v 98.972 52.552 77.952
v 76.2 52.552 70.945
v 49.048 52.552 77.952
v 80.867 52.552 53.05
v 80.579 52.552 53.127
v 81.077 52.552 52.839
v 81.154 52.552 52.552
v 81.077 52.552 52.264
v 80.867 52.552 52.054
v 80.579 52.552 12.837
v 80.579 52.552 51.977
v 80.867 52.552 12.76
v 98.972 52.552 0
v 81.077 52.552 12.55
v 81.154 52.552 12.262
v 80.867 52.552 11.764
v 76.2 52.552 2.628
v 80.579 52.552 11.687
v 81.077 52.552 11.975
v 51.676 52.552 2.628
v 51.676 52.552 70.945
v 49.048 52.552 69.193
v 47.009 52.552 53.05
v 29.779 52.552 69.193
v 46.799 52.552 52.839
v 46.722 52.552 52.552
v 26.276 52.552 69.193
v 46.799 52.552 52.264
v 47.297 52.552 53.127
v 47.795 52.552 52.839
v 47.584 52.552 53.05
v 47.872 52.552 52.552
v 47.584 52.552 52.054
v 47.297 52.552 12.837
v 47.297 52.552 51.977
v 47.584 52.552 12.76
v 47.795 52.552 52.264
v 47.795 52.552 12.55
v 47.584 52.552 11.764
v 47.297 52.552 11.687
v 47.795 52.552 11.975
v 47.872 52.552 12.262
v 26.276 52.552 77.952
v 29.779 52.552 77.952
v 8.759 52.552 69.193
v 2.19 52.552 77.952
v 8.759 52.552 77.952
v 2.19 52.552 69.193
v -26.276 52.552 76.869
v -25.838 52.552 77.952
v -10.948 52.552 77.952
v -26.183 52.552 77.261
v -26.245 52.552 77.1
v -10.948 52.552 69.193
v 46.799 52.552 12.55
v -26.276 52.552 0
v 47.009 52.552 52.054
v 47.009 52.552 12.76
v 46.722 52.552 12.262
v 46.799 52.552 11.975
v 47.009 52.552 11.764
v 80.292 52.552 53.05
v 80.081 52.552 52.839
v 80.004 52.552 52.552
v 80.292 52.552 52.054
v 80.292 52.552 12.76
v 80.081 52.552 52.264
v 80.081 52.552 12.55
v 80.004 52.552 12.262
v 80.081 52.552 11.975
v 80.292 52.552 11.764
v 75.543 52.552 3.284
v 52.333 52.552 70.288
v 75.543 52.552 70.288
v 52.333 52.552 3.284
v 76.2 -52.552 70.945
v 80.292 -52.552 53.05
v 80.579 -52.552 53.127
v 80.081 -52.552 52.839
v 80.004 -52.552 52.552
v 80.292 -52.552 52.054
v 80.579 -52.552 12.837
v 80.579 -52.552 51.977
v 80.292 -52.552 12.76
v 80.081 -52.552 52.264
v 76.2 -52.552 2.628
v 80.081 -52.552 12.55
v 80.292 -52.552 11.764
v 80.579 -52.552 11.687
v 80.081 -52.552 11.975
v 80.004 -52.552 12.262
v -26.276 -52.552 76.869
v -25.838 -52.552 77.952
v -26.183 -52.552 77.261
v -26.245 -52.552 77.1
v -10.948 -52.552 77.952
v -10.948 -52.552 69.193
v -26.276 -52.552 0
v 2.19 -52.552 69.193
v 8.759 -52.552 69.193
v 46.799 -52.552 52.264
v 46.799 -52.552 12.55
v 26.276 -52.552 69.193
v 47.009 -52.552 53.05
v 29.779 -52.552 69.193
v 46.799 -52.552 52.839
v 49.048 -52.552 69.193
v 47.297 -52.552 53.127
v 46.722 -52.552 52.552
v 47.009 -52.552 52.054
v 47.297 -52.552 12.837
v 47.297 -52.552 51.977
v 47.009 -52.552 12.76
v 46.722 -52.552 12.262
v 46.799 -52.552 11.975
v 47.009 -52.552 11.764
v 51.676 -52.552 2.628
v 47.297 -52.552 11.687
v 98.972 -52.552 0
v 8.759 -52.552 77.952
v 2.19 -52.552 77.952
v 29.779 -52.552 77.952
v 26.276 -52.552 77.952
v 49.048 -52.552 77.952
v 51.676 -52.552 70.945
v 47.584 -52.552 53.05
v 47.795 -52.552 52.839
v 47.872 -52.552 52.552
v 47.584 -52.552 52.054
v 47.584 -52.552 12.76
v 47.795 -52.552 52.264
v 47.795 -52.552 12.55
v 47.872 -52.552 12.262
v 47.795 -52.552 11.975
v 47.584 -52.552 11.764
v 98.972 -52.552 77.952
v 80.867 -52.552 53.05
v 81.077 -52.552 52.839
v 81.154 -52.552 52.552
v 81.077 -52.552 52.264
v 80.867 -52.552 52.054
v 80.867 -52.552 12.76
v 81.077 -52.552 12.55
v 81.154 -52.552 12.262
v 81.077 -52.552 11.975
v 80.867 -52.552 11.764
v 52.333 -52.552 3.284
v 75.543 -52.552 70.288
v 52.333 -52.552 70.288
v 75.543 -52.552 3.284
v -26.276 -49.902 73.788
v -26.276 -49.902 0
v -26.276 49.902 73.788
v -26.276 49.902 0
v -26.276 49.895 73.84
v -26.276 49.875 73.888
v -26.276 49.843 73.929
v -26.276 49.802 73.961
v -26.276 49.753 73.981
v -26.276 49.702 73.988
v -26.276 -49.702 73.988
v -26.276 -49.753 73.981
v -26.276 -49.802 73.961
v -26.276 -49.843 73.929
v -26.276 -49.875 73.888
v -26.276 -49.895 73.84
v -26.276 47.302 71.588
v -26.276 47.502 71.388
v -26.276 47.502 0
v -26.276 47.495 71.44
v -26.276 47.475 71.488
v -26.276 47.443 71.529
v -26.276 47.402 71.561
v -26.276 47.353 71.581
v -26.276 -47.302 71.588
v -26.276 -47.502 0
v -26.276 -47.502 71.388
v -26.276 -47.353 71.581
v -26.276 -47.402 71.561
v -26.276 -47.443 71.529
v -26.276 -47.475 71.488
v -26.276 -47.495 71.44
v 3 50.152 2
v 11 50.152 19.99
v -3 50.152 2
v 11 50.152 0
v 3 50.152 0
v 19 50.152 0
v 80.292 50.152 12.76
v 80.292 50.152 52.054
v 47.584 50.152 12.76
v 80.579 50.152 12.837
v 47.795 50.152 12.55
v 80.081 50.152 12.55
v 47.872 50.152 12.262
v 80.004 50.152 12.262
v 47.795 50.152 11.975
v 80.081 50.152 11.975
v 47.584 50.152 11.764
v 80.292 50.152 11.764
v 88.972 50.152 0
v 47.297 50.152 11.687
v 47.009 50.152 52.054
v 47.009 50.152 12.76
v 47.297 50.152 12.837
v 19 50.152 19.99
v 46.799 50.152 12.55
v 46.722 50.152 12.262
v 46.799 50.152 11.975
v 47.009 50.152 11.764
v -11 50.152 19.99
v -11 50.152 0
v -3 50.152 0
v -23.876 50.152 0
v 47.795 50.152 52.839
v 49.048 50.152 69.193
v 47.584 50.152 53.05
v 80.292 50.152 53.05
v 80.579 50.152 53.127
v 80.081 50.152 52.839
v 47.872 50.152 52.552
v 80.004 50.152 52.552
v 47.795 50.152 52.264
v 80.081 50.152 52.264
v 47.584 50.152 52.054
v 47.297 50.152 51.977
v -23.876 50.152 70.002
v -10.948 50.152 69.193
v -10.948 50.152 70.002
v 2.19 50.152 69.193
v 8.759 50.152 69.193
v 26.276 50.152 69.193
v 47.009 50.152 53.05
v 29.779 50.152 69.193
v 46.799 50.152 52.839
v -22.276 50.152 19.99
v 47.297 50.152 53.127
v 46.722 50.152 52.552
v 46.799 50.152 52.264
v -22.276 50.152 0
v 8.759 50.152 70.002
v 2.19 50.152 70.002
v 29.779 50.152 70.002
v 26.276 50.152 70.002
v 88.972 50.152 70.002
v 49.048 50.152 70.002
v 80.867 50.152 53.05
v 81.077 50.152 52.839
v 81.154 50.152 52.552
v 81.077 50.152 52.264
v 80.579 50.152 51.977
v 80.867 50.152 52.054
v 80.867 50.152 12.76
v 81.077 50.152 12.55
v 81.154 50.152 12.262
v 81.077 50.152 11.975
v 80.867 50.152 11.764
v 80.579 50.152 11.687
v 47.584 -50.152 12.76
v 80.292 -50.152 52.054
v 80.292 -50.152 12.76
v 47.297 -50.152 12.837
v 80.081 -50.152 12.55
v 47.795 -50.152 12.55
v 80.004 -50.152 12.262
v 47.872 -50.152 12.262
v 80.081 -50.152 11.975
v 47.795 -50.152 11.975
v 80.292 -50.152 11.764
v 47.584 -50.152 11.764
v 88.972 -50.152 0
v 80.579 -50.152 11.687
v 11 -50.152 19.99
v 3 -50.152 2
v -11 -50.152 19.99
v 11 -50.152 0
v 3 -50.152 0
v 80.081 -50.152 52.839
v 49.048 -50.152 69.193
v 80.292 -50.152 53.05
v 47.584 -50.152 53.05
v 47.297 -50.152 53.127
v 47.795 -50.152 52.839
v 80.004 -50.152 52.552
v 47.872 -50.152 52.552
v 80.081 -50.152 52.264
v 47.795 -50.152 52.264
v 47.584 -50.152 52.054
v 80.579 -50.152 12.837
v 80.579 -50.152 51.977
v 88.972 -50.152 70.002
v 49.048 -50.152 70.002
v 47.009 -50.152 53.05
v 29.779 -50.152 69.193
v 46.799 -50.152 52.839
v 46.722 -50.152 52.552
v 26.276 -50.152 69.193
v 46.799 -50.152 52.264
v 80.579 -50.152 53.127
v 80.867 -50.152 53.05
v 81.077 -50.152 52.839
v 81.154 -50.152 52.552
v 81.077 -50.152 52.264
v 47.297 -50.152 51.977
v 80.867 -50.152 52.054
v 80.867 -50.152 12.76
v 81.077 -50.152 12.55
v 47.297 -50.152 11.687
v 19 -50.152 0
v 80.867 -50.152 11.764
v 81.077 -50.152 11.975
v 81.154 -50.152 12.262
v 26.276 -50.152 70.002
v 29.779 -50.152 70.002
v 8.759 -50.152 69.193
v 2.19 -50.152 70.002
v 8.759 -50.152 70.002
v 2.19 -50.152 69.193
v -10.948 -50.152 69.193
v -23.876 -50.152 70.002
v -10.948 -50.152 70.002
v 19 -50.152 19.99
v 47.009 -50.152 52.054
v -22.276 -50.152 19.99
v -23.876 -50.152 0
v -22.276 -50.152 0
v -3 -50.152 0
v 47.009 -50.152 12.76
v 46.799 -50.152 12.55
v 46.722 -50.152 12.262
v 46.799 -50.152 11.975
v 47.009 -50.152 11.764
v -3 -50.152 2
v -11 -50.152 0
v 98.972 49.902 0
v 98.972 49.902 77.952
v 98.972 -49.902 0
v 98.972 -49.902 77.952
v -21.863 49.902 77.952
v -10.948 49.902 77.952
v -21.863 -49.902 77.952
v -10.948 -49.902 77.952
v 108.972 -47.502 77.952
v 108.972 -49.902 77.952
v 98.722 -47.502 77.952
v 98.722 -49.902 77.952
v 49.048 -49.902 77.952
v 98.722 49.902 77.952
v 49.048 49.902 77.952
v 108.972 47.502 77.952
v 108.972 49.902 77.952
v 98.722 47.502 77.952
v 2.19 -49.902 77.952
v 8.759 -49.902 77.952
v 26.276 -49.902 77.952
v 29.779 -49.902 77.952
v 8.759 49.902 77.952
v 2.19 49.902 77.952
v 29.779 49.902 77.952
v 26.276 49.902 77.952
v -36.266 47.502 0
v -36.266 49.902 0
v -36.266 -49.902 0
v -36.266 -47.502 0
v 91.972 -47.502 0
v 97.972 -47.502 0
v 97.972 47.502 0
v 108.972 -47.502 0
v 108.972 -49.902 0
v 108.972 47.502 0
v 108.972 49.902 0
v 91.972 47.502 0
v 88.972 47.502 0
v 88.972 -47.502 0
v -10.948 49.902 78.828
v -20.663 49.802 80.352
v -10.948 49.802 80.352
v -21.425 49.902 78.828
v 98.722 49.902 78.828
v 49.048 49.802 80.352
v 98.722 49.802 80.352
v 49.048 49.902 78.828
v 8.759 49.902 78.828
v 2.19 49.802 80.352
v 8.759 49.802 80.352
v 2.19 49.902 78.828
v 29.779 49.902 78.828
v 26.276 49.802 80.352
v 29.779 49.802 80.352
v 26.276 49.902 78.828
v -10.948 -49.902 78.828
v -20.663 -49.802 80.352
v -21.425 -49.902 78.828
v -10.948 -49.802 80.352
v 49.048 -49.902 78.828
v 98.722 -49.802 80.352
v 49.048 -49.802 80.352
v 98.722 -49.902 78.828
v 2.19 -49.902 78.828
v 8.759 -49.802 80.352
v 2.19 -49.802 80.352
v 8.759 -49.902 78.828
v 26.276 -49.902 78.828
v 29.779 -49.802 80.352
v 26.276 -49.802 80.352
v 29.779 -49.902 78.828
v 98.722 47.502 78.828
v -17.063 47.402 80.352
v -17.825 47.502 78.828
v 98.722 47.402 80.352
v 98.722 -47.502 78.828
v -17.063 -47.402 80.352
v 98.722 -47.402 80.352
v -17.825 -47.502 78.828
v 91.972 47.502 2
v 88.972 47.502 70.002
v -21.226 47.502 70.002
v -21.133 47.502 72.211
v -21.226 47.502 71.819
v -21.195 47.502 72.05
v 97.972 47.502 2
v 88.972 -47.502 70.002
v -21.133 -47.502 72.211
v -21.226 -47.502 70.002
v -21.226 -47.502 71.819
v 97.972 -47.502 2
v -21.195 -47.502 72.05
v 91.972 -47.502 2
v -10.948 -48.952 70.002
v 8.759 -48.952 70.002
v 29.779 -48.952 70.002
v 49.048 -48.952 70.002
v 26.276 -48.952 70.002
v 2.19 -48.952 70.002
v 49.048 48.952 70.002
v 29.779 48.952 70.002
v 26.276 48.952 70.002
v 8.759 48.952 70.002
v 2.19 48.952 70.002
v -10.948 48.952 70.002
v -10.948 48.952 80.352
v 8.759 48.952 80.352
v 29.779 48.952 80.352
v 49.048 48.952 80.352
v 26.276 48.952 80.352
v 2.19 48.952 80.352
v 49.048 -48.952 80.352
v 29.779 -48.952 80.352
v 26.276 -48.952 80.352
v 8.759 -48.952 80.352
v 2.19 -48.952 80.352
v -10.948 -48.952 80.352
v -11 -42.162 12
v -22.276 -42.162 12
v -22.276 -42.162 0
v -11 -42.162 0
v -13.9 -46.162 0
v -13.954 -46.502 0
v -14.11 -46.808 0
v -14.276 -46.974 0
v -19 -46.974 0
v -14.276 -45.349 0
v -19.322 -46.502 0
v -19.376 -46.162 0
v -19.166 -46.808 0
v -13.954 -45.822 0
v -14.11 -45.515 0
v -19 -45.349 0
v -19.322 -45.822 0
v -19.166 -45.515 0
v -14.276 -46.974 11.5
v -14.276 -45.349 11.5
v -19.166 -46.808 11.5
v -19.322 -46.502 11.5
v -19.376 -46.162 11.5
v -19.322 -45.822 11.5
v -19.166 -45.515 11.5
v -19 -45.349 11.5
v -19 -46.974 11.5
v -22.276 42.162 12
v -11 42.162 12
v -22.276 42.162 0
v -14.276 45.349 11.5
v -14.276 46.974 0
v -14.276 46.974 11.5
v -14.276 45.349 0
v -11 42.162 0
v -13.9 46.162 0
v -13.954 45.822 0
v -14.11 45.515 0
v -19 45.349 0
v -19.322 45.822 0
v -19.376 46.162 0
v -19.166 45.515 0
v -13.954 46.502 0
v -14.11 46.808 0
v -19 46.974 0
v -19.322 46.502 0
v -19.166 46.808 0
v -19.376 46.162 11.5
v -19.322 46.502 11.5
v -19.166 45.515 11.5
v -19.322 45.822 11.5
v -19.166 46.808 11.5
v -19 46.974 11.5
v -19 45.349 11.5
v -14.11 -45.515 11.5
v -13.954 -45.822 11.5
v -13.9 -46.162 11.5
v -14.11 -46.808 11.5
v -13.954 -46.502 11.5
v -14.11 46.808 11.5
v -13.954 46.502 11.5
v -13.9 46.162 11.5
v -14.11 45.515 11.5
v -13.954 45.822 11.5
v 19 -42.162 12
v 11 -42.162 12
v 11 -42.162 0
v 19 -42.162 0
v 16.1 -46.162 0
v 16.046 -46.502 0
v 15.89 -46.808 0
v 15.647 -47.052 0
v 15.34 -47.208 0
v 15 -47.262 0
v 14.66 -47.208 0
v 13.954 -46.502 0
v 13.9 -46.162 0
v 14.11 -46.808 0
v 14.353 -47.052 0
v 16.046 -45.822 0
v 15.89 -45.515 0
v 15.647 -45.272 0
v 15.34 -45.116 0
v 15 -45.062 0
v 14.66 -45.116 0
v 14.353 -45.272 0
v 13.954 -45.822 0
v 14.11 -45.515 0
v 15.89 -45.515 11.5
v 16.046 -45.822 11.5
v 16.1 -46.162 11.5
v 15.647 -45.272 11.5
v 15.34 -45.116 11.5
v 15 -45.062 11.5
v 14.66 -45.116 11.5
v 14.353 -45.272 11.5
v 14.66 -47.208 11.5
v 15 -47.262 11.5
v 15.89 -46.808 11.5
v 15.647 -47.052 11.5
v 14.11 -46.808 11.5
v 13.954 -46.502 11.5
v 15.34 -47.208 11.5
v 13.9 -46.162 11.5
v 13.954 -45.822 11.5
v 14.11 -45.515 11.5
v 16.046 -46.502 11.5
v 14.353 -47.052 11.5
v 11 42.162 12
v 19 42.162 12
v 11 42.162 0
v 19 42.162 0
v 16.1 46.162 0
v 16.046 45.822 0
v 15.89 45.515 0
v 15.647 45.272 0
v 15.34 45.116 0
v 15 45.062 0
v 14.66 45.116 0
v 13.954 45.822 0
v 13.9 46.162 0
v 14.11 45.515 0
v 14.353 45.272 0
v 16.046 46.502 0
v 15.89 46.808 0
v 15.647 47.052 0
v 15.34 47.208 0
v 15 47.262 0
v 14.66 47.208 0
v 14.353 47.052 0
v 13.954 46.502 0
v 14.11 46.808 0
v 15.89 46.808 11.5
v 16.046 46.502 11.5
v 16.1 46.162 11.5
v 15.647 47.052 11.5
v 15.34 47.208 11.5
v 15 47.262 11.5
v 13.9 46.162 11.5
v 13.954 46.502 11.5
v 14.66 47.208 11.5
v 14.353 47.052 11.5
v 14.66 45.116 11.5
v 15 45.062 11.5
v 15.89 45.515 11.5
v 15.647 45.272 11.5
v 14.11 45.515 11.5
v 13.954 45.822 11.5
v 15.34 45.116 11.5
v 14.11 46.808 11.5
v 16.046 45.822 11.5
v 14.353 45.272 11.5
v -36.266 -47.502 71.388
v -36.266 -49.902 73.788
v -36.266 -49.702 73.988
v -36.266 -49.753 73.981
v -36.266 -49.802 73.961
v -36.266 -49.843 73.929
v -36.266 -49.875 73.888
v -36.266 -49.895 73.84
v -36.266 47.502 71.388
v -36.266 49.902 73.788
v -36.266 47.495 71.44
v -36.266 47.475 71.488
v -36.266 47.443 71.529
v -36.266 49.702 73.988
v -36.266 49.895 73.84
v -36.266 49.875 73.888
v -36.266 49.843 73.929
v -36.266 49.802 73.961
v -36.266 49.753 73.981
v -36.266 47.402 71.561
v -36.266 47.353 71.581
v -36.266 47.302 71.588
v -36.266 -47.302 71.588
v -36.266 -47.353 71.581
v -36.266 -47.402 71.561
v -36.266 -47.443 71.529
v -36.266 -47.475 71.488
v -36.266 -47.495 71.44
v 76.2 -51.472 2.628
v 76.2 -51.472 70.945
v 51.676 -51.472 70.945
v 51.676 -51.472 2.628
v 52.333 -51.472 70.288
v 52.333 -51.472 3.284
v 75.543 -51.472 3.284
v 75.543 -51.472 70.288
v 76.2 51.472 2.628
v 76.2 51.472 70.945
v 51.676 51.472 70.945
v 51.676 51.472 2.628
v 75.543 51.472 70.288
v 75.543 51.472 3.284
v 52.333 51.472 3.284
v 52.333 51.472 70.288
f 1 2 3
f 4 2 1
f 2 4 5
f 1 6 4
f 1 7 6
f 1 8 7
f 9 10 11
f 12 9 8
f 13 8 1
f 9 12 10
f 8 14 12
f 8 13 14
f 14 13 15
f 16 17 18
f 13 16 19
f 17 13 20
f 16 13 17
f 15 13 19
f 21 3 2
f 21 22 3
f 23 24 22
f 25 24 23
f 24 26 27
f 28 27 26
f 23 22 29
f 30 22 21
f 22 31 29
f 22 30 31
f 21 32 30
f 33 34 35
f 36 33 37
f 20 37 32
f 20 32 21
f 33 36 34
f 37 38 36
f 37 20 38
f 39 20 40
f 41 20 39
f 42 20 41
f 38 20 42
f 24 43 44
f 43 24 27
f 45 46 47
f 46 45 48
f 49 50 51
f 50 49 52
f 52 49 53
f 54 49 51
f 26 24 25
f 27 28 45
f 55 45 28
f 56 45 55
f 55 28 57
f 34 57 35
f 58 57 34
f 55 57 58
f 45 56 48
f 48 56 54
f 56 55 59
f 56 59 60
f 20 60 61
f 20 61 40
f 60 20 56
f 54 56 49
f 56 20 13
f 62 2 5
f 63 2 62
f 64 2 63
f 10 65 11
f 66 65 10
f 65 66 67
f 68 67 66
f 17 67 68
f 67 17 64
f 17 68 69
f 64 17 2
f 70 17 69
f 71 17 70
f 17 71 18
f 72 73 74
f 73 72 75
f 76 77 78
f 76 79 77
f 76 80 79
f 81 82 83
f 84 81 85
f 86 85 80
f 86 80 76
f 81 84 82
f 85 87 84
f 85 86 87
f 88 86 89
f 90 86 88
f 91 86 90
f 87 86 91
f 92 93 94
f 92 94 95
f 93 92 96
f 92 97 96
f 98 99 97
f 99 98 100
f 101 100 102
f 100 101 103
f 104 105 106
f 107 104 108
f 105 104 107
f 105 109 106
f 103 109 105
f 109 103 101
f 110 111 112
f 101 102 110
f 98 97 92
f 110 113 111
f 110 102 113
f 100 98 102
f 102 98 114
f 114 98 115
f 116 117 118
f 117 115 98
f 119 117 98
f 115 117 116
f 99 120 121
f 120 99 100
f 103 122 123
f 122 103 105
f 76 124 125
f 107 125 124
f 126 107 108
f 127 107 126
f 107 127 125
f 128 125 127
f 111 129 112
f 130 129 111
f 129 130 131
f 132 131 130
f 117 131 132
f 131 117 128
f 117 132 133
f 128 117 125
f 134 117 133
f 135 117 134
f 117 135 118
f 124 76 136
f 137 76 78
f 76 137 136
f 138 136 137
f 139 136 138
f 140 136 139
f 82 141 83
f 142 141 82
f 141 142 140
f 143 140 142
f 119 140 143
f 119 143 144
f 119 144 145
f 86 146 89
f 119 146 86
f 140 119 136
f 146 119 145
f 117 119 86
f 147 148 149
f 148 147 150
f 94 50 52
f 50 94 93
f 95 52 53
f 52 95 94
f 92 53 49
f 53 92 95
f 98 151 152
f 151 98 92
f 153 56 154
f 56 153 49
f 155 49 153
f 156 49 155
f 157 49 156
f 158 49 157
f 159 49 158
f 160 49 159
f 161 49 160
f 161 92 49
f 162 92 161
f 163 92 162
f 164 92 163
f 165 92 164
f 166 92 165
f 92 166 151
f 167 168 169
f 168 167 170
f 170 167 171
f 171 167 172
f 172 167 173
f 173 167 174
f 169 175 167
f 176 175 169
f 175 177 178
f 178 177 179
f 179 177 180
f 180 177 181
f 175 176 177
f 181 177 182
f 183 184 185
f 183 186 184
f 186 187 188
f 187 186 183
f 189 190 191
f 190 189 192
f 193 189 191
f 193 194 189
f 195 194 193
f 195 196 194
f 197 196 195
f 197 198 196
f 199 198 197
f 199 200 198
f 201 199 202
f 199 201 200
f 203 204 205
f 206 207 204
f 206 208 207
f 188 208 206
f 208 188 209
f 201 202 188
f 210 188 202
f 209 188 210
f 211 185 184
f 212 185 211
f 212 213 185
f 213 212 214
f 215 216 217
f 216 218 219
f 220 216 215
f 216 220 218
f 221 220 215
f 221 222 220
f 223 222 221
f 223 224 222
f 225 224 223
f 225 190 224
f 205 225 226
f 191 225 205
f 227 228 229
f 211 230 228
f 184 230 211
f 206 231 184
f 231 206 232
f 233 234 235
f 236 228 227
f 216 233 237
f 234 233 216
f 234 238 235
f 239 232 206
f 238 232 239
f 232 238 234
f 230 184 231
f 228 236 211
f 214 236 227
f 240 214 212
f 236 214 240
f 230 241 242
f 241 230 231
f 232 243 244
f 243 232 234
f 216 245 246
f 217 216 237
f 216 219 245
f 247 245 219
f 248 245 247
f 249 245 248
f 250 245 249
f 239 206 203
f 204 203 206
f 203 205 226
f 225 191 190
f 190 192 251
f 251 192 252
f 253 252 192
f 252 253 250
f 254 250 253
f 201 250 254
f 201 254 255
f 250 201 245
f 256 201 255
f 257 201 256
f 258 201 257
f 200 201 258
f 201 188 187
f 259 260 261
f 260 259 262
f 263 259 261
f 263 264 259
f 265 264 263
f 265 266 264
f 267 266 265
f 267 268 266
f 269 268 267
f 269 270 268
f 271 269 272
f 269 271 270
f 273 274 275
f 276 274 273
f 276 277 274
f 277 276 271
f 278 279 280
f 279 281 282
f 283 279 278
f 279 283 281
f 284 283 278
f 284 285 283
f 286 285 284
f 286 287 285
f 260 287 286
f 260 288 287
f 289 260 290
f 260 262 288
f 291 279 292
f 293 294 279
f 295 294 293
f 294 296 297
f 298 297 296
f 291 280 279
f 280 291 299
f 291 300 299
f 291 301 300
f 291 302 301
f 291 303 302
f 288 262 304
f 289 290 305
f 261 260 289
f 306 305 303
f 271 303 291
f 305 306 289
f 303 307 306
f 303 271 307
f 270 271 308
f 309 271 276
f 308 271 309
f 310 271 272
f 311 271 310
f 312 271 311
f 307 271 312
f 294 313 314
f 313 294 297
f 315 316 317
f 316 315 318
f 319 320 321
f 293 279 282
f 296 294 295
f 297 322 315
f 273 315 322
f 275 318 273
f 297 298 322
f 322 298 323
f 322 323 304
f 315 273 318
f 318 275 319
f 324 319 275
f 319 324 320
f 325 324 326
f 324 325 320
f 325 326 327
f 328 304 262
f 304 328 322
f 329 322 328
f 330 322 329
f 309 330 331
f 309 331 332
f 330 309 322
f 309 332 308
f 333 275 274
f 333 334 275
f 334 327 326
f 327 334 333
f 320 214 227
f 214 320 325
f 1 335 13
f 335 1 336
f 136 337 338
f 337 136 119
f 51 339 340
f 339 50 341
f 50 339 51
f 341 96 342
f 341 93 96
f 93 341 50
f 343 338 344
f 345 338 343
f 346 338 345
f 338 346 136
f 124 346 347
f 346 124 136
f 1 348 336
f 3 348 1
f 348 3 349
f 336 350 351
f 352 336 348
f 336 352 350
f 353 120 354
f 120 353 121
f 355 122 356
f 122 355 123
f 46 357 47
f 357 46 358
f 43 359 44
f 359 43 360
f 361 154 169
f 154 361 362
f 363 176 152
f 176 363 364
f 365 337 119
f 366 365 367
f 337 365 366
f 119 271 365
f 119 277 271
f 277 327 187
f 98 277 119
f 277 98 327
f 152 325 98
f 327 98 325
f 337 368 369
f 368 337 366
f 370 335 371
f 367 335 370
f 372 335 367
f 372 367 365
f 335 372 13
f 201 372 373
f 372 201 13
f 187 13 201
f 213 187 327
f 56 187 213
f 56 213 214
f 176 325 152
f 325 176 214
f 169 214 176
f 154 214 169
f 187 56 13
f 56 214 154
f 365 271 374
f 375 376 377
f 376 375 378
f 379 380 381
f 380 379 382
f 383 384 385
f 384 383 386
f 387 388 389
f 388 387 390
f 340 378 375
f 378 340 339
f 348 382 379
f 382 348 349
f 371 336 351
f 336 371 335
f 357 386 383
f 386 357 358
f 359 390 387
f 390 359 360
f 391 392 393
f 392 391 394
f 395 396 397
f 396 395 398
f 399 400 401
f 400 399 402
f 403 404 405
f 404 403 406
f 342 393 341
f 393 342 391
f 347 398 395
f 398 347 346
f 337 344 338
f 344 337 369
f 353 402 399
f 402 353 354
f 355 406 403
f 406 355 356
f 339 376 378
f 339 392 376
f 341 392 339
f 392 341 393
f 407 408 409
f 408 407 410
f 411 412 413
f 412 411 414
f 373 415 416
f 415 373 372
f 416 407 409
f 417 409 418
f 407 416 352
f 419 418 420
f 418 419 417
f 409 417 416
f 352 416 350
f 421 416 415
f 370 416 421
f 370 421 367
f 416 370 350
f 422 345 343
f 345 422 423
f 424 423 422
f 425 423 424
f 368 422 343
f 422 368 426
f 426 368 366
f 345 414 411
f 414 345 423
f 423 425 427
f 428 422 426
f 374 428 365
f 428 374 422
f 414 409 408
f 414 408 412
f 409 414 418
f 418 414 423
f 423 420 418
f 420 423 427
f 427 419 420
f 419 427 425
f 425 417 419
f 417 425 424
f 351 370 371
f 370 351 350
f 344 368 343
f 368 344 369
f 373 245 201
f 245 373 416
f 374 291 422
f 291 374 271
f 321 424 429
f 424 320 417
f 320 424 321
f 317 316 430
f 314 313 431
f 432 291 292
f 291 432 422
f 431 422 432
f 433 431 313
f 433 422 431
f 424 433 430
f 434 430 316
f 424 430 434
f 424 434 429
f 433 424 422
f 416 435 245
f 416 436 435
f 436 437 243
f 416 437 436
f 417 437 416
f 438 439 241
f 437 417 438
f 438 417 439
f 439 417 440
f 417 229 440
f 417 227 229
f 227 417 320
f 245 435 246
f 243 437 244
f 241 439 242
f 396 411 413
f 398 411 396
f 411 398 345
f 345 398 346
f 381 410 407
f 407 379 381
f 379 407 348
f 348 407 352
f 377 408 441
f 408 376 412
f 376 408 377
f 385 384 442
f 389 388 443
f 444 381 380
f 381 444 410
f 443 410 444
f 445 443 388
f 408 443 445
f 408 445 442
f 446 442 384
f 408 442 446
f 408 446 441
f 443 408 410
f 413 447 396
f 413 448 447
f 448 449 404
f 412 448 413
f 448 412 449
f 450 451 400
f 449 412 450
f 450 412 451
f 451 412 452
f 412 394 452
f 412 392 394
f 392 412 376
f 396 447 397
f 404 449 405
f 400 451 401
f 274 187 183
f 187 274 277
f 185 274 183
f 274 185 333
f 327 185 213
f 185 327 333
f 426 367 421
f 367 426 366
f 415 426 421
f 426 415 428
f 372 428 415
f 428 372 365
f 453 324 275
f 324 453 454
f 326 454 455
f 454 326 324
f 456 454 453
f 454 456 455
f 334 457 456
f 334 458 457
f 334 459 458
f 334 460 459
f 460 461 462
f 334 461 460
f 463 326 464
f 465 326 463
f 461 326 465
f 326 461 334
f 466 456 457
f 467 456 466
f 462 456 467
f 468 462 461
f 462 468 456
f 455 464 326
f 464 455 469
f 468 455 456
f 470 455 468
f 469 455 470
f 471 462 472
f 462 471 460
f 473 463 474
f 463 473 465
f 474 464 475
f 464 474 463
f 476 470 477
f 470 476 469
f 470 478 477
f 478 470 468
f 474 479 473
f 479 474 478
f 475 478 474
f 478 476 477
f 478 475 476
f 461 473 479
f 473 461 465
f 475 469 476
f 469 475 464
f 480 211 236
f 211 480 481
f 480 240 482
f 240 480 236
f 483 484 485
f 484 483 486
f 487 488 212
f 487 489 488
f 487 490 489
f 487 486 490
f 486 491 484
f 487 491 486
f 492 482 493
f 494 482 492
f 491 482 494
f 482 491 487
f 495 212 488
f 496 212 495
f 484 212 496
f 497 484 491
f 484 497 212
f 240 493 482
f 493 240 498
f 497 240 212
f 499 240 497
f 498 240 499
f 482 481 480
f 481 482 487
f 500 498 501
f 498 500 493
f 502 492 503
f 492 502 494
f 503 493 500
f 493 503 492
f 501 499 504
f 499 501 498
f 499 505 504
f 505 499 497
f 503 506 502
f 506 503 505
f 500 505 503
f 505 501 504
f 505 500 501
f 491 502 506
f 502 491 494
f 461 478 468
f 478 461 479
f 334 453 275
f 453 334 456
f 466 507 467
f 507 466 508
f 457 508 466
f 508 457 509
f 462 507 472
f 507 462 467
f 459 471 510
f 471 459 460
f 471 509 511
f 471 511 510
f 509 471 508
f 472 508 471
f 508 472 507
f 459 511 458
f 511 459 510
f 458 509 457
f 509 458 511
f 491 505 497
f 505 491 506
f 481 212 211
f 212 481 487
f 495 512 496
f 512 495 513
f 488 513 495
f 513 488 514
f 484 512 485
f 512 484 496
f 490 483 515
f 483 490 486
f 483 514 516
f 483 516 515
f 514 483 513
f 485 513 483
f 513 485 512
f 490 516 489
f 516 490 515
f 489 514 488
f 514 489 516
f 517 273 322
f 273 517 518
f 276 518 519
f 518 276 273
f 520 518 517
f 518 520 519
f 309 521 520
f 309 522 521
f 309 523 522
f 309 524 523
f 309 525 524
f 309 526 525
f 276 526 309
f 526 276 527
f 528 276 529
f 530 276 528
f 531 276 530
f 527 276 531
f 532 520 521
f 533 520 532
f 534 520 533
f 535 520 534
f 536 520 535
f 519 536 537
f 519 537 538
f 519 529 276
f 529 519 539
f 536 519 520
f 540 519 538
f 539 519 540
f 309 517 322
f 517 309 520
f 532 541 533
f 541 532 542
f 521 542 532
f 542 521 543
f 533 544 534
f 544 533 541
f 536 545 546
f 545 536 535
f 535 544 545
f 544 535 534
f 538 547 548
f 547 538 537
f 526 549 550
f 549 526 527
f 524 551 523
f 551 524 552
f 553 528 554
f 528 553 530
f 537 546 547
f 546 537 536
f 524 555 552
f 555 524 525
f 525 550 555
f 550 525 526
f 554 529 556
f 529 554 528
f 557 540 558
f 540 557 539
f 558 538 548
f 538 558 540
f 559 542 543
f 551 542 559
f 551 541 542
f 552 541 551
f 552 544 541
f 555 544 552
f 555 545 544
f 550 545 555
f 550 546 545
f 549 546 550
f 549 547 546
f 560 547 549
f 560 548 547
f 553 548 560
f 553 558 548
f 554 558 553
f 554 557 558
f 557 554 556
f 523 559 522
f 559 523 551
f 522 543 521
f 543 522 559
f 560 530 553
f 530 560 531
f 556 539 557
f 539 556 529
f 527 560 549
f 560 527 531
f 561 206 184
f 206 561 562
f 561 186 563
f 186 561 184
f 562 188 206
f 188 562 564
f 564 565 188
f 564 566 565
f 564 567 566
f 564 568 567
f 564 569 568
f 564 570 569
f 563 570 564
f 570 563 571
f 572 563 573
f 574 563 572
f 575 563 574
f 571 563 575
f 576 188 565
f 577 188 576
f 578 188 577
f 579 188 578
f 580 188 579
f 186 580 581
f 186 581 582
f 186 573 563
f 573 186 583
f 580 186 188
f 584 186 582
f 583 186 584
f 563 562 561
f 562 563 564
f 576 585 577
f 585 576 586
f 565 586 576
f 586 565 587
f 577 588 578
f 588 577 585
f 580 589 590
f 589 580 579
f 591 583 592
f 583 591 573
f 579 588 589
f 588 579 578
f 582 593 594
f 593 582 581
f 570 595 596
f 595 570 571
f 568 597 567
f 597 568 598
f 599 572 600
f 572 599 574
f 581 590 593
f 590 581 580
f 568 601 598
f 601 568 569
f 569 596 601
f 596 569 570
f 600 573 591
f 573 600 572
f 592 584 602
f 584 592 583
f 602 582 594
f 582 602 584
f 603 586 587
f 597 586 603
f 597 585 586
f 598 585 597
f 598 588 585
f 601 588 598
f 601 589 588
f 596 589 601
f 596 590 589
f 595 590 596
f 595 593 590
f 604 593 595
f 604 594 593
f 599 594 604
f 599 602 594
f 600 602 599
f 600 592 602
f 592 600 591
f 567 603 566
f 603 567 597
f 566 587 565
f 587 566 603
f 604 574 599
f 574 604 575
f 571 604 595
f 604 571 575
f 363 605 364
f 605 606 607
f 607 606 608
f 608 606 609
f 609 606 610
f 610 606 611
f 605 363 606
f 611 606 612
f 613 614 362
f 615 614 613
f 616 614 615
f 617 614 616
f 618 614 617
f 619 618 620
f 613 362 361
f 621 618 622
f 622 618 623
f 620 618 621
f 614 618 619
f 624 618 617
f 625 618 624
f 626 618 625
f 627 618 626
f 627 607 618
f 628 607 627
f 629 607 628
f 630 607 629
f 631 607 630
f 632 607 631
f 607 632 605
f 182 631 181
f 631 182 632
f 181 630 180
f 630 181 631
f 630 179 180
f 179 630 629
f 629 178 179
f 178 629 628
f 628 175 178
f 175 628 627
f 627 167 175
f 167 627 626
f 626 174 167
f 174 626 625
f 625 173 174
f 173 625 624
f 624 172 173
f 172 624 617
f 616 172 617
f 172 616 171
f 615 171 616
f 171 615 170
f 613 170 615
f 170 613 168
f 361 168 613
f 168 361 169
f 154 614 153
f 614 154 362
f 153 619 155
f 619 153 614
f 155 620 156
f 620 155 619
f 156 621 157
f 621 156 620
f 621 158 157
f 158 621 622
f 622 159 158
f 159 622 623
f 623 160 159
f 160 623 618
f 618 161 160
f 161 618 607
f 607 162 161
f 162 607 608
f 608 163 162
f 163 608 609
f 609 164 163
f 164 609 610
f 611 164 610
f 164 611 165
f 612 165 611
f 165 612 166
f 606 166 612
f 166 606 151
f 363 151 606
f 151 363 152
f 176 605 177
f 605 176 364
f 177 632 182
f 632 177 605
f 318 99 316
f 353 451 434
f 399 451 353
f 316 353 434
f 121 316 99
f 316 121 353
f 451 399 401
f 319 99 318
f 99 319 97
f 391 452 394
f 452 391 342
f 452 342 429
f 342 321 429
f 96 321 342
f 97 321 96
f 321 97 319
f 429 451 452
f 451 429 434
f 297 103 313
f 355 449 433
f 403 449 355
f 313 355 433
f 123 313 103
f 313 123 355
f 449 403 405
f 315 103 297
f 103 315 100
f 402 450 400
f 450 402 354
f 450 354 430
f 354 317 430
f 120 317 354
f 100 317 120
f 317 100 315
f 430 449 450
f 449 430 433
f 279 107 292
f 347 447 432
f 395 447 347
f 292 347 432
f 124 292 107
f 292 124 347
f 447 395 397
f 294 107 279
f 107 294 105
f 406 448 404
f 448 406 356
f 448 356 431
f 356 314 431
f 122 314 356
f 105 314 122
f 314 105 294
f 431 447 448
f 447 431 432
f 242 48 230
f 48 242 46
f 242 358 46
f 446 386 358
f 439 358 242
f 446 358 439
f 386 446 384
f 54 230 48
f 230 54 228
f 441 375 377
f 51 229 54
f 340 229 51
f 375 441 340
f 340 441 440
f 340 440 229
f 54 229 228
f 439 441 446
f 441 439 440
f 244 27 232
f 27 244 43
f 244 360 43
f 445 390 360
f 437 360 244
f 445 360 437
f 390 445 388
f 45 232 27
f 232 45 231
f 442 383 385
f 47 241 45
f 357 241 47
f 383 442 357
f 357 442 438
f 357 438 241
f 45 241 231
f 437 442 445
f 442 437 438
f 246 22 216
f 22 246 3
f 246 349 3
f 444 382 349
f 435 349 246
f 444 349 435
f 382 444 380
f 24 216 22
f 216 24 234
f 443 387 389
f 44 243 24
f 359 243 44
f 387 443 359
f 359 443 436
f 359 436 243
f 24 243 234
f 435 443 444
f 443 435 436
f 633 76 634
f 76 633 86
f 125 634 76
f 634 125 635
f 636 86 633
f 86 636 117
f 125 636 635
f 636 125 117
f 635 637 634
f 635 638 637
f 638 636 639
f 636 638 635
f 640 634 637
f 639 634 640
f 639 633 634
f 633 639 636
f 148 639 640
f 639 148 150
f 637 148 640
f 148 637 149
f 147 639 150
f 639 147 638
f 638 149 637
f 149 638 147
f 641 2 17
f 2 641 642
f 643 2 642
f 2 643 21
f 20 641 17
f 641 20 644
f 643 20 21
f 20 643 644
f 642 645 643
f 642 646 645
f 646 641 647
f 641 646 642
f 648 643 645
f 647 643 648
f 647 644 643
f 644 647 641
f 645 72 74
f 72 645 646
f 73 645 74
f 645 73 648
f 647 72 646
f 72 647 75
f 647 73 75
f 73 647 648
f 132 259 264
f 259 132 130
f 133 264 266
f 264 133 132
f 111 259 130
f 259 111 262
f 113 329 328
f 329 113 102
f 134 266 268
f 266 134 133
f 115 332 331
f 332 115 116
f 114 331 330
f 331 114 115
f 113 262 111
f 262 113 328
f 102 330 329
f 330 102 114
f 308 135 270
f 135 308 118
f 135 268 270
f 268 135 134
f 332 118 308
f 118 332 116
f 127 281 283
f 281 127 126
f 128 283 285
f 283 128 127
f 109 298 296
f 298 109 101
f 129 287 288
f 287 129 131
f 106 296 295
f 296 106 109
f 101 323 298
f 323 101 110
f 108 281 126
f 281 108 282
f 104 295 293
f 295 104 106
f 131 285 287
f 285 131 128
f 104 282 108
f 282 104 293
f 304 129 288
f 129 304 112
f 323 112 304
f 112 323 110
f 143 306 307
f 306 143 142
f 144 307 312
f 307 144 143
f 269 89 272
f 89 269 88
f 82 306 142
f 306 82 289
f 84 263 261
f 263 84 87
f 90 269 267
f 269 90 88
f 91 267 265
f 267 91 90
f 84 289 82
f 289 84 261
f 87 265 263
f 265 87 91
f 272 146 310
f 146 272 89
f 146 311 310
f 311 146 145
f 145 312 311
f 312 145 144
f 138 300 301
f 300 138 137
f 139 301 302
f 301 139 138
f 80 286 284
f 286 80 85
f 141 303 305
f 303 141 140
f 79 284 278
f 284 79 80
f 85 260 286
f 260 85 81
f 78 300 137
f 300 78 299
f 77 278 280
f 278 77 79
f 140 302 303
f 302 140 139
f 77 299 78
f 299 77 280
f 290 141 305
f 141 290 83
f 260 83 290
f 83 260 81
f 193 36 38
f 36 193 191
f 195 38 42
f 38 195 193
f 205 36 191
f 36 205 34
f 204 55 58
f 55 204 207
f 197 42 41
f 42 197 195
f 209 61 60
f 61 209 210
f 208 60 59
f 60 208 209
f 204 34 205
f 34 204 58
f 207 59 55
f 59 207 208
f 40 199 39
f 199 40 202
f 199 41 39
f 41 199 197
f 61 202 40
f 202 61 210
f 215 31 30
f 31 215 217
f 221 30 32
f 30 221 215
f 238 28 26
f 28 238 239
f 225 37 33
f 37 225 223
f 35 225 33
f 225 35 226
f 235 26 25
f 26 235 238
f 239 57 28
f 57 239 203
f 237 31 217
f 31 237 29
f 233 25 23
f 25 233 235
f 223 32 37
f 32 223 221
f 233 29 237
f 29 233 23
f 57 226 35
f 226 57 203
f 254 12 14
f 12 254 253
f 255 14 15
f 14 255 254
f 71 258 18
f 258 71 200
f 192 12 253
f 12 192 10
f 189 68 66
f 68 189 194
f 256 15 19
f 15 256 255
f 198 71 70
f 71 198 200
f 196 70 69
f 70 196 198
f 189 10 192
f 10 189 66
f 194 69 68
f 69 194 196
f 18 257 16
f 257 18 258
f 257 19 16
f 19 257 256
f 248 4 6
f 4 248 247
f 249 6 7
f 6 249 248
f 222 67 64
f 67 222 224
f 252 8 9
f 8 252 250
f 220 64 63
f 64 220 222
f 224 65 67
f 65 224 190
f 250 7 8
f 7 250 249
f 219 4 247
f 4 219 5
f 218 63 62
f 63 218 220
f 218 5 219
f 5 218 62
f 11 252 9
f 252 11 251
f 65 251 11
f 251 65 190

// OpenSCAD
// Milwaukee Road Little Joe, G scale 1-29 - print 1 of 20: body_1 - sides and ends, section 1 (print upright)
// Render (F6), export STL, print. Settings: ../../library/lj_params.scad
// Whole loco preview and notes: ../../MILW_LittleJoe_Main.scad
SCALE_SEL = "G";
LOCO_SEL = "E70";   // [E20, E21, E70, E71, E72, E73, E74, E75, E76, E77, E78, E79] the body and roof change for E20 / E21
include <../../library/lj_all.scad>
lj_plate("body_1");
